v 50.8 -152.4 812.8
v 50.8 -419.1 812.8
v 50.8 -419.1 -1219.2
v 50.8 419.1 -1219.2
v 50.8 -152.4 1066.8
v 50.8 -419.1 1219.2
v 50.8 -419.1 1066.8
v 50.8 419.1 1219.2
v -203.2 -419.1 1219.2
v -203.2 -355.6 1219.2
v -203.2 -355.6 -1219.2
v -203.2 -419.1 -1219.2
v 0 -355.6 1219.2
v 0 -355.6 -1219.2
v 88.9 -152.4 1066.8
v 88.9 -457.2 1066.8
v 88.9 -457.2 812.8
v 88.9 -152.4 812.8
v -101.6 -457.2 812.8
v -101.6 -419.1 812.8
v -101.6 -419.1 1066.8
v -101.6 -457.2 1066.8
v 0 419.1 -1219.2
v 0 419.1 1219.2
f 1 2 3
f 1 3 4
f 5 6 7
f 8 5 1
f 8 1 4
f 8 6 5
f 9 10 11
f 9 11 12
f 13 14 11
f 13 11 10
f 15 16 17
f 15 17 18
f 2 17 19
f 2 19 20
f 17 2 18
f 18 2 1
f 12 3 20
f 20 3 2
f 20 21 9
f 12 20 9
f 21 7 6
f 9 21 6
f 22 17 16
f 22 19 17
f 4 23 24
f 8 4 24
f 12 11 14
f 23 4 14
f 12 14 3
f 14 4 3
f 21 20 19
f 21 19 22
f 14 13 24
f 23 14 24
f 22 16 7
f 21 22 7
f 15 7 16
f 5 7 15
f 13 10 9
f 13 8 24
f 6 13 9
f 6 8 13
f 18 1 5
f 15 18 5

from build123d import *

# Parameters (mm, degrees)
F0_W     = 838.2
F0_H     = 2438.4
F1_DEPTH = 50.8
F2_W     = 63.5
F2_H     = 2438.4
F3_DEPTH = 203.2
F4_W     = 152.4
F4_H     = 254
F5_DEPTH = 38.1
F6_W     = 304.8
F6_H     = 254
F7_DEPTH = 38.1


with BuildPart() as f1:
    # F0 (on Right) → F1 (new body)
    with BuildSketch(Plane.YZ):
        Rectangle(F0_W, F0_H)
    extrude(amount=F1_DEPTH)

    # F2 (on face) → F3 (join)
    with BuildSketch(Plane(origin=(0, 0, 0), x_dir=(0, -1, 0), z_dir=(-1, 0, 0))):
        with Locations((387.35, 0)):
            Rectangle(F2_W, F2_H)
    extrude(amount=F3_DEPTH)

    # F4 (on face) → F5 (join)
    with BuildSketch(Plane.XZ.offset(419.1)):
        with Locations((-25.4, 939.8)):
            Rectangle(F4_W, F4_H)
    extrude(amount=F5_DEPTH)

    # F6 (on face) → F7 (join)
    with BuildSketch(Plane.YZ.offset(50.8)):
        with Locations((-304.8, 939.8)):
            Rectangle(F6_W, F6_H)
    extrude(amount=F7_DEPTH)


solid = f1.part
